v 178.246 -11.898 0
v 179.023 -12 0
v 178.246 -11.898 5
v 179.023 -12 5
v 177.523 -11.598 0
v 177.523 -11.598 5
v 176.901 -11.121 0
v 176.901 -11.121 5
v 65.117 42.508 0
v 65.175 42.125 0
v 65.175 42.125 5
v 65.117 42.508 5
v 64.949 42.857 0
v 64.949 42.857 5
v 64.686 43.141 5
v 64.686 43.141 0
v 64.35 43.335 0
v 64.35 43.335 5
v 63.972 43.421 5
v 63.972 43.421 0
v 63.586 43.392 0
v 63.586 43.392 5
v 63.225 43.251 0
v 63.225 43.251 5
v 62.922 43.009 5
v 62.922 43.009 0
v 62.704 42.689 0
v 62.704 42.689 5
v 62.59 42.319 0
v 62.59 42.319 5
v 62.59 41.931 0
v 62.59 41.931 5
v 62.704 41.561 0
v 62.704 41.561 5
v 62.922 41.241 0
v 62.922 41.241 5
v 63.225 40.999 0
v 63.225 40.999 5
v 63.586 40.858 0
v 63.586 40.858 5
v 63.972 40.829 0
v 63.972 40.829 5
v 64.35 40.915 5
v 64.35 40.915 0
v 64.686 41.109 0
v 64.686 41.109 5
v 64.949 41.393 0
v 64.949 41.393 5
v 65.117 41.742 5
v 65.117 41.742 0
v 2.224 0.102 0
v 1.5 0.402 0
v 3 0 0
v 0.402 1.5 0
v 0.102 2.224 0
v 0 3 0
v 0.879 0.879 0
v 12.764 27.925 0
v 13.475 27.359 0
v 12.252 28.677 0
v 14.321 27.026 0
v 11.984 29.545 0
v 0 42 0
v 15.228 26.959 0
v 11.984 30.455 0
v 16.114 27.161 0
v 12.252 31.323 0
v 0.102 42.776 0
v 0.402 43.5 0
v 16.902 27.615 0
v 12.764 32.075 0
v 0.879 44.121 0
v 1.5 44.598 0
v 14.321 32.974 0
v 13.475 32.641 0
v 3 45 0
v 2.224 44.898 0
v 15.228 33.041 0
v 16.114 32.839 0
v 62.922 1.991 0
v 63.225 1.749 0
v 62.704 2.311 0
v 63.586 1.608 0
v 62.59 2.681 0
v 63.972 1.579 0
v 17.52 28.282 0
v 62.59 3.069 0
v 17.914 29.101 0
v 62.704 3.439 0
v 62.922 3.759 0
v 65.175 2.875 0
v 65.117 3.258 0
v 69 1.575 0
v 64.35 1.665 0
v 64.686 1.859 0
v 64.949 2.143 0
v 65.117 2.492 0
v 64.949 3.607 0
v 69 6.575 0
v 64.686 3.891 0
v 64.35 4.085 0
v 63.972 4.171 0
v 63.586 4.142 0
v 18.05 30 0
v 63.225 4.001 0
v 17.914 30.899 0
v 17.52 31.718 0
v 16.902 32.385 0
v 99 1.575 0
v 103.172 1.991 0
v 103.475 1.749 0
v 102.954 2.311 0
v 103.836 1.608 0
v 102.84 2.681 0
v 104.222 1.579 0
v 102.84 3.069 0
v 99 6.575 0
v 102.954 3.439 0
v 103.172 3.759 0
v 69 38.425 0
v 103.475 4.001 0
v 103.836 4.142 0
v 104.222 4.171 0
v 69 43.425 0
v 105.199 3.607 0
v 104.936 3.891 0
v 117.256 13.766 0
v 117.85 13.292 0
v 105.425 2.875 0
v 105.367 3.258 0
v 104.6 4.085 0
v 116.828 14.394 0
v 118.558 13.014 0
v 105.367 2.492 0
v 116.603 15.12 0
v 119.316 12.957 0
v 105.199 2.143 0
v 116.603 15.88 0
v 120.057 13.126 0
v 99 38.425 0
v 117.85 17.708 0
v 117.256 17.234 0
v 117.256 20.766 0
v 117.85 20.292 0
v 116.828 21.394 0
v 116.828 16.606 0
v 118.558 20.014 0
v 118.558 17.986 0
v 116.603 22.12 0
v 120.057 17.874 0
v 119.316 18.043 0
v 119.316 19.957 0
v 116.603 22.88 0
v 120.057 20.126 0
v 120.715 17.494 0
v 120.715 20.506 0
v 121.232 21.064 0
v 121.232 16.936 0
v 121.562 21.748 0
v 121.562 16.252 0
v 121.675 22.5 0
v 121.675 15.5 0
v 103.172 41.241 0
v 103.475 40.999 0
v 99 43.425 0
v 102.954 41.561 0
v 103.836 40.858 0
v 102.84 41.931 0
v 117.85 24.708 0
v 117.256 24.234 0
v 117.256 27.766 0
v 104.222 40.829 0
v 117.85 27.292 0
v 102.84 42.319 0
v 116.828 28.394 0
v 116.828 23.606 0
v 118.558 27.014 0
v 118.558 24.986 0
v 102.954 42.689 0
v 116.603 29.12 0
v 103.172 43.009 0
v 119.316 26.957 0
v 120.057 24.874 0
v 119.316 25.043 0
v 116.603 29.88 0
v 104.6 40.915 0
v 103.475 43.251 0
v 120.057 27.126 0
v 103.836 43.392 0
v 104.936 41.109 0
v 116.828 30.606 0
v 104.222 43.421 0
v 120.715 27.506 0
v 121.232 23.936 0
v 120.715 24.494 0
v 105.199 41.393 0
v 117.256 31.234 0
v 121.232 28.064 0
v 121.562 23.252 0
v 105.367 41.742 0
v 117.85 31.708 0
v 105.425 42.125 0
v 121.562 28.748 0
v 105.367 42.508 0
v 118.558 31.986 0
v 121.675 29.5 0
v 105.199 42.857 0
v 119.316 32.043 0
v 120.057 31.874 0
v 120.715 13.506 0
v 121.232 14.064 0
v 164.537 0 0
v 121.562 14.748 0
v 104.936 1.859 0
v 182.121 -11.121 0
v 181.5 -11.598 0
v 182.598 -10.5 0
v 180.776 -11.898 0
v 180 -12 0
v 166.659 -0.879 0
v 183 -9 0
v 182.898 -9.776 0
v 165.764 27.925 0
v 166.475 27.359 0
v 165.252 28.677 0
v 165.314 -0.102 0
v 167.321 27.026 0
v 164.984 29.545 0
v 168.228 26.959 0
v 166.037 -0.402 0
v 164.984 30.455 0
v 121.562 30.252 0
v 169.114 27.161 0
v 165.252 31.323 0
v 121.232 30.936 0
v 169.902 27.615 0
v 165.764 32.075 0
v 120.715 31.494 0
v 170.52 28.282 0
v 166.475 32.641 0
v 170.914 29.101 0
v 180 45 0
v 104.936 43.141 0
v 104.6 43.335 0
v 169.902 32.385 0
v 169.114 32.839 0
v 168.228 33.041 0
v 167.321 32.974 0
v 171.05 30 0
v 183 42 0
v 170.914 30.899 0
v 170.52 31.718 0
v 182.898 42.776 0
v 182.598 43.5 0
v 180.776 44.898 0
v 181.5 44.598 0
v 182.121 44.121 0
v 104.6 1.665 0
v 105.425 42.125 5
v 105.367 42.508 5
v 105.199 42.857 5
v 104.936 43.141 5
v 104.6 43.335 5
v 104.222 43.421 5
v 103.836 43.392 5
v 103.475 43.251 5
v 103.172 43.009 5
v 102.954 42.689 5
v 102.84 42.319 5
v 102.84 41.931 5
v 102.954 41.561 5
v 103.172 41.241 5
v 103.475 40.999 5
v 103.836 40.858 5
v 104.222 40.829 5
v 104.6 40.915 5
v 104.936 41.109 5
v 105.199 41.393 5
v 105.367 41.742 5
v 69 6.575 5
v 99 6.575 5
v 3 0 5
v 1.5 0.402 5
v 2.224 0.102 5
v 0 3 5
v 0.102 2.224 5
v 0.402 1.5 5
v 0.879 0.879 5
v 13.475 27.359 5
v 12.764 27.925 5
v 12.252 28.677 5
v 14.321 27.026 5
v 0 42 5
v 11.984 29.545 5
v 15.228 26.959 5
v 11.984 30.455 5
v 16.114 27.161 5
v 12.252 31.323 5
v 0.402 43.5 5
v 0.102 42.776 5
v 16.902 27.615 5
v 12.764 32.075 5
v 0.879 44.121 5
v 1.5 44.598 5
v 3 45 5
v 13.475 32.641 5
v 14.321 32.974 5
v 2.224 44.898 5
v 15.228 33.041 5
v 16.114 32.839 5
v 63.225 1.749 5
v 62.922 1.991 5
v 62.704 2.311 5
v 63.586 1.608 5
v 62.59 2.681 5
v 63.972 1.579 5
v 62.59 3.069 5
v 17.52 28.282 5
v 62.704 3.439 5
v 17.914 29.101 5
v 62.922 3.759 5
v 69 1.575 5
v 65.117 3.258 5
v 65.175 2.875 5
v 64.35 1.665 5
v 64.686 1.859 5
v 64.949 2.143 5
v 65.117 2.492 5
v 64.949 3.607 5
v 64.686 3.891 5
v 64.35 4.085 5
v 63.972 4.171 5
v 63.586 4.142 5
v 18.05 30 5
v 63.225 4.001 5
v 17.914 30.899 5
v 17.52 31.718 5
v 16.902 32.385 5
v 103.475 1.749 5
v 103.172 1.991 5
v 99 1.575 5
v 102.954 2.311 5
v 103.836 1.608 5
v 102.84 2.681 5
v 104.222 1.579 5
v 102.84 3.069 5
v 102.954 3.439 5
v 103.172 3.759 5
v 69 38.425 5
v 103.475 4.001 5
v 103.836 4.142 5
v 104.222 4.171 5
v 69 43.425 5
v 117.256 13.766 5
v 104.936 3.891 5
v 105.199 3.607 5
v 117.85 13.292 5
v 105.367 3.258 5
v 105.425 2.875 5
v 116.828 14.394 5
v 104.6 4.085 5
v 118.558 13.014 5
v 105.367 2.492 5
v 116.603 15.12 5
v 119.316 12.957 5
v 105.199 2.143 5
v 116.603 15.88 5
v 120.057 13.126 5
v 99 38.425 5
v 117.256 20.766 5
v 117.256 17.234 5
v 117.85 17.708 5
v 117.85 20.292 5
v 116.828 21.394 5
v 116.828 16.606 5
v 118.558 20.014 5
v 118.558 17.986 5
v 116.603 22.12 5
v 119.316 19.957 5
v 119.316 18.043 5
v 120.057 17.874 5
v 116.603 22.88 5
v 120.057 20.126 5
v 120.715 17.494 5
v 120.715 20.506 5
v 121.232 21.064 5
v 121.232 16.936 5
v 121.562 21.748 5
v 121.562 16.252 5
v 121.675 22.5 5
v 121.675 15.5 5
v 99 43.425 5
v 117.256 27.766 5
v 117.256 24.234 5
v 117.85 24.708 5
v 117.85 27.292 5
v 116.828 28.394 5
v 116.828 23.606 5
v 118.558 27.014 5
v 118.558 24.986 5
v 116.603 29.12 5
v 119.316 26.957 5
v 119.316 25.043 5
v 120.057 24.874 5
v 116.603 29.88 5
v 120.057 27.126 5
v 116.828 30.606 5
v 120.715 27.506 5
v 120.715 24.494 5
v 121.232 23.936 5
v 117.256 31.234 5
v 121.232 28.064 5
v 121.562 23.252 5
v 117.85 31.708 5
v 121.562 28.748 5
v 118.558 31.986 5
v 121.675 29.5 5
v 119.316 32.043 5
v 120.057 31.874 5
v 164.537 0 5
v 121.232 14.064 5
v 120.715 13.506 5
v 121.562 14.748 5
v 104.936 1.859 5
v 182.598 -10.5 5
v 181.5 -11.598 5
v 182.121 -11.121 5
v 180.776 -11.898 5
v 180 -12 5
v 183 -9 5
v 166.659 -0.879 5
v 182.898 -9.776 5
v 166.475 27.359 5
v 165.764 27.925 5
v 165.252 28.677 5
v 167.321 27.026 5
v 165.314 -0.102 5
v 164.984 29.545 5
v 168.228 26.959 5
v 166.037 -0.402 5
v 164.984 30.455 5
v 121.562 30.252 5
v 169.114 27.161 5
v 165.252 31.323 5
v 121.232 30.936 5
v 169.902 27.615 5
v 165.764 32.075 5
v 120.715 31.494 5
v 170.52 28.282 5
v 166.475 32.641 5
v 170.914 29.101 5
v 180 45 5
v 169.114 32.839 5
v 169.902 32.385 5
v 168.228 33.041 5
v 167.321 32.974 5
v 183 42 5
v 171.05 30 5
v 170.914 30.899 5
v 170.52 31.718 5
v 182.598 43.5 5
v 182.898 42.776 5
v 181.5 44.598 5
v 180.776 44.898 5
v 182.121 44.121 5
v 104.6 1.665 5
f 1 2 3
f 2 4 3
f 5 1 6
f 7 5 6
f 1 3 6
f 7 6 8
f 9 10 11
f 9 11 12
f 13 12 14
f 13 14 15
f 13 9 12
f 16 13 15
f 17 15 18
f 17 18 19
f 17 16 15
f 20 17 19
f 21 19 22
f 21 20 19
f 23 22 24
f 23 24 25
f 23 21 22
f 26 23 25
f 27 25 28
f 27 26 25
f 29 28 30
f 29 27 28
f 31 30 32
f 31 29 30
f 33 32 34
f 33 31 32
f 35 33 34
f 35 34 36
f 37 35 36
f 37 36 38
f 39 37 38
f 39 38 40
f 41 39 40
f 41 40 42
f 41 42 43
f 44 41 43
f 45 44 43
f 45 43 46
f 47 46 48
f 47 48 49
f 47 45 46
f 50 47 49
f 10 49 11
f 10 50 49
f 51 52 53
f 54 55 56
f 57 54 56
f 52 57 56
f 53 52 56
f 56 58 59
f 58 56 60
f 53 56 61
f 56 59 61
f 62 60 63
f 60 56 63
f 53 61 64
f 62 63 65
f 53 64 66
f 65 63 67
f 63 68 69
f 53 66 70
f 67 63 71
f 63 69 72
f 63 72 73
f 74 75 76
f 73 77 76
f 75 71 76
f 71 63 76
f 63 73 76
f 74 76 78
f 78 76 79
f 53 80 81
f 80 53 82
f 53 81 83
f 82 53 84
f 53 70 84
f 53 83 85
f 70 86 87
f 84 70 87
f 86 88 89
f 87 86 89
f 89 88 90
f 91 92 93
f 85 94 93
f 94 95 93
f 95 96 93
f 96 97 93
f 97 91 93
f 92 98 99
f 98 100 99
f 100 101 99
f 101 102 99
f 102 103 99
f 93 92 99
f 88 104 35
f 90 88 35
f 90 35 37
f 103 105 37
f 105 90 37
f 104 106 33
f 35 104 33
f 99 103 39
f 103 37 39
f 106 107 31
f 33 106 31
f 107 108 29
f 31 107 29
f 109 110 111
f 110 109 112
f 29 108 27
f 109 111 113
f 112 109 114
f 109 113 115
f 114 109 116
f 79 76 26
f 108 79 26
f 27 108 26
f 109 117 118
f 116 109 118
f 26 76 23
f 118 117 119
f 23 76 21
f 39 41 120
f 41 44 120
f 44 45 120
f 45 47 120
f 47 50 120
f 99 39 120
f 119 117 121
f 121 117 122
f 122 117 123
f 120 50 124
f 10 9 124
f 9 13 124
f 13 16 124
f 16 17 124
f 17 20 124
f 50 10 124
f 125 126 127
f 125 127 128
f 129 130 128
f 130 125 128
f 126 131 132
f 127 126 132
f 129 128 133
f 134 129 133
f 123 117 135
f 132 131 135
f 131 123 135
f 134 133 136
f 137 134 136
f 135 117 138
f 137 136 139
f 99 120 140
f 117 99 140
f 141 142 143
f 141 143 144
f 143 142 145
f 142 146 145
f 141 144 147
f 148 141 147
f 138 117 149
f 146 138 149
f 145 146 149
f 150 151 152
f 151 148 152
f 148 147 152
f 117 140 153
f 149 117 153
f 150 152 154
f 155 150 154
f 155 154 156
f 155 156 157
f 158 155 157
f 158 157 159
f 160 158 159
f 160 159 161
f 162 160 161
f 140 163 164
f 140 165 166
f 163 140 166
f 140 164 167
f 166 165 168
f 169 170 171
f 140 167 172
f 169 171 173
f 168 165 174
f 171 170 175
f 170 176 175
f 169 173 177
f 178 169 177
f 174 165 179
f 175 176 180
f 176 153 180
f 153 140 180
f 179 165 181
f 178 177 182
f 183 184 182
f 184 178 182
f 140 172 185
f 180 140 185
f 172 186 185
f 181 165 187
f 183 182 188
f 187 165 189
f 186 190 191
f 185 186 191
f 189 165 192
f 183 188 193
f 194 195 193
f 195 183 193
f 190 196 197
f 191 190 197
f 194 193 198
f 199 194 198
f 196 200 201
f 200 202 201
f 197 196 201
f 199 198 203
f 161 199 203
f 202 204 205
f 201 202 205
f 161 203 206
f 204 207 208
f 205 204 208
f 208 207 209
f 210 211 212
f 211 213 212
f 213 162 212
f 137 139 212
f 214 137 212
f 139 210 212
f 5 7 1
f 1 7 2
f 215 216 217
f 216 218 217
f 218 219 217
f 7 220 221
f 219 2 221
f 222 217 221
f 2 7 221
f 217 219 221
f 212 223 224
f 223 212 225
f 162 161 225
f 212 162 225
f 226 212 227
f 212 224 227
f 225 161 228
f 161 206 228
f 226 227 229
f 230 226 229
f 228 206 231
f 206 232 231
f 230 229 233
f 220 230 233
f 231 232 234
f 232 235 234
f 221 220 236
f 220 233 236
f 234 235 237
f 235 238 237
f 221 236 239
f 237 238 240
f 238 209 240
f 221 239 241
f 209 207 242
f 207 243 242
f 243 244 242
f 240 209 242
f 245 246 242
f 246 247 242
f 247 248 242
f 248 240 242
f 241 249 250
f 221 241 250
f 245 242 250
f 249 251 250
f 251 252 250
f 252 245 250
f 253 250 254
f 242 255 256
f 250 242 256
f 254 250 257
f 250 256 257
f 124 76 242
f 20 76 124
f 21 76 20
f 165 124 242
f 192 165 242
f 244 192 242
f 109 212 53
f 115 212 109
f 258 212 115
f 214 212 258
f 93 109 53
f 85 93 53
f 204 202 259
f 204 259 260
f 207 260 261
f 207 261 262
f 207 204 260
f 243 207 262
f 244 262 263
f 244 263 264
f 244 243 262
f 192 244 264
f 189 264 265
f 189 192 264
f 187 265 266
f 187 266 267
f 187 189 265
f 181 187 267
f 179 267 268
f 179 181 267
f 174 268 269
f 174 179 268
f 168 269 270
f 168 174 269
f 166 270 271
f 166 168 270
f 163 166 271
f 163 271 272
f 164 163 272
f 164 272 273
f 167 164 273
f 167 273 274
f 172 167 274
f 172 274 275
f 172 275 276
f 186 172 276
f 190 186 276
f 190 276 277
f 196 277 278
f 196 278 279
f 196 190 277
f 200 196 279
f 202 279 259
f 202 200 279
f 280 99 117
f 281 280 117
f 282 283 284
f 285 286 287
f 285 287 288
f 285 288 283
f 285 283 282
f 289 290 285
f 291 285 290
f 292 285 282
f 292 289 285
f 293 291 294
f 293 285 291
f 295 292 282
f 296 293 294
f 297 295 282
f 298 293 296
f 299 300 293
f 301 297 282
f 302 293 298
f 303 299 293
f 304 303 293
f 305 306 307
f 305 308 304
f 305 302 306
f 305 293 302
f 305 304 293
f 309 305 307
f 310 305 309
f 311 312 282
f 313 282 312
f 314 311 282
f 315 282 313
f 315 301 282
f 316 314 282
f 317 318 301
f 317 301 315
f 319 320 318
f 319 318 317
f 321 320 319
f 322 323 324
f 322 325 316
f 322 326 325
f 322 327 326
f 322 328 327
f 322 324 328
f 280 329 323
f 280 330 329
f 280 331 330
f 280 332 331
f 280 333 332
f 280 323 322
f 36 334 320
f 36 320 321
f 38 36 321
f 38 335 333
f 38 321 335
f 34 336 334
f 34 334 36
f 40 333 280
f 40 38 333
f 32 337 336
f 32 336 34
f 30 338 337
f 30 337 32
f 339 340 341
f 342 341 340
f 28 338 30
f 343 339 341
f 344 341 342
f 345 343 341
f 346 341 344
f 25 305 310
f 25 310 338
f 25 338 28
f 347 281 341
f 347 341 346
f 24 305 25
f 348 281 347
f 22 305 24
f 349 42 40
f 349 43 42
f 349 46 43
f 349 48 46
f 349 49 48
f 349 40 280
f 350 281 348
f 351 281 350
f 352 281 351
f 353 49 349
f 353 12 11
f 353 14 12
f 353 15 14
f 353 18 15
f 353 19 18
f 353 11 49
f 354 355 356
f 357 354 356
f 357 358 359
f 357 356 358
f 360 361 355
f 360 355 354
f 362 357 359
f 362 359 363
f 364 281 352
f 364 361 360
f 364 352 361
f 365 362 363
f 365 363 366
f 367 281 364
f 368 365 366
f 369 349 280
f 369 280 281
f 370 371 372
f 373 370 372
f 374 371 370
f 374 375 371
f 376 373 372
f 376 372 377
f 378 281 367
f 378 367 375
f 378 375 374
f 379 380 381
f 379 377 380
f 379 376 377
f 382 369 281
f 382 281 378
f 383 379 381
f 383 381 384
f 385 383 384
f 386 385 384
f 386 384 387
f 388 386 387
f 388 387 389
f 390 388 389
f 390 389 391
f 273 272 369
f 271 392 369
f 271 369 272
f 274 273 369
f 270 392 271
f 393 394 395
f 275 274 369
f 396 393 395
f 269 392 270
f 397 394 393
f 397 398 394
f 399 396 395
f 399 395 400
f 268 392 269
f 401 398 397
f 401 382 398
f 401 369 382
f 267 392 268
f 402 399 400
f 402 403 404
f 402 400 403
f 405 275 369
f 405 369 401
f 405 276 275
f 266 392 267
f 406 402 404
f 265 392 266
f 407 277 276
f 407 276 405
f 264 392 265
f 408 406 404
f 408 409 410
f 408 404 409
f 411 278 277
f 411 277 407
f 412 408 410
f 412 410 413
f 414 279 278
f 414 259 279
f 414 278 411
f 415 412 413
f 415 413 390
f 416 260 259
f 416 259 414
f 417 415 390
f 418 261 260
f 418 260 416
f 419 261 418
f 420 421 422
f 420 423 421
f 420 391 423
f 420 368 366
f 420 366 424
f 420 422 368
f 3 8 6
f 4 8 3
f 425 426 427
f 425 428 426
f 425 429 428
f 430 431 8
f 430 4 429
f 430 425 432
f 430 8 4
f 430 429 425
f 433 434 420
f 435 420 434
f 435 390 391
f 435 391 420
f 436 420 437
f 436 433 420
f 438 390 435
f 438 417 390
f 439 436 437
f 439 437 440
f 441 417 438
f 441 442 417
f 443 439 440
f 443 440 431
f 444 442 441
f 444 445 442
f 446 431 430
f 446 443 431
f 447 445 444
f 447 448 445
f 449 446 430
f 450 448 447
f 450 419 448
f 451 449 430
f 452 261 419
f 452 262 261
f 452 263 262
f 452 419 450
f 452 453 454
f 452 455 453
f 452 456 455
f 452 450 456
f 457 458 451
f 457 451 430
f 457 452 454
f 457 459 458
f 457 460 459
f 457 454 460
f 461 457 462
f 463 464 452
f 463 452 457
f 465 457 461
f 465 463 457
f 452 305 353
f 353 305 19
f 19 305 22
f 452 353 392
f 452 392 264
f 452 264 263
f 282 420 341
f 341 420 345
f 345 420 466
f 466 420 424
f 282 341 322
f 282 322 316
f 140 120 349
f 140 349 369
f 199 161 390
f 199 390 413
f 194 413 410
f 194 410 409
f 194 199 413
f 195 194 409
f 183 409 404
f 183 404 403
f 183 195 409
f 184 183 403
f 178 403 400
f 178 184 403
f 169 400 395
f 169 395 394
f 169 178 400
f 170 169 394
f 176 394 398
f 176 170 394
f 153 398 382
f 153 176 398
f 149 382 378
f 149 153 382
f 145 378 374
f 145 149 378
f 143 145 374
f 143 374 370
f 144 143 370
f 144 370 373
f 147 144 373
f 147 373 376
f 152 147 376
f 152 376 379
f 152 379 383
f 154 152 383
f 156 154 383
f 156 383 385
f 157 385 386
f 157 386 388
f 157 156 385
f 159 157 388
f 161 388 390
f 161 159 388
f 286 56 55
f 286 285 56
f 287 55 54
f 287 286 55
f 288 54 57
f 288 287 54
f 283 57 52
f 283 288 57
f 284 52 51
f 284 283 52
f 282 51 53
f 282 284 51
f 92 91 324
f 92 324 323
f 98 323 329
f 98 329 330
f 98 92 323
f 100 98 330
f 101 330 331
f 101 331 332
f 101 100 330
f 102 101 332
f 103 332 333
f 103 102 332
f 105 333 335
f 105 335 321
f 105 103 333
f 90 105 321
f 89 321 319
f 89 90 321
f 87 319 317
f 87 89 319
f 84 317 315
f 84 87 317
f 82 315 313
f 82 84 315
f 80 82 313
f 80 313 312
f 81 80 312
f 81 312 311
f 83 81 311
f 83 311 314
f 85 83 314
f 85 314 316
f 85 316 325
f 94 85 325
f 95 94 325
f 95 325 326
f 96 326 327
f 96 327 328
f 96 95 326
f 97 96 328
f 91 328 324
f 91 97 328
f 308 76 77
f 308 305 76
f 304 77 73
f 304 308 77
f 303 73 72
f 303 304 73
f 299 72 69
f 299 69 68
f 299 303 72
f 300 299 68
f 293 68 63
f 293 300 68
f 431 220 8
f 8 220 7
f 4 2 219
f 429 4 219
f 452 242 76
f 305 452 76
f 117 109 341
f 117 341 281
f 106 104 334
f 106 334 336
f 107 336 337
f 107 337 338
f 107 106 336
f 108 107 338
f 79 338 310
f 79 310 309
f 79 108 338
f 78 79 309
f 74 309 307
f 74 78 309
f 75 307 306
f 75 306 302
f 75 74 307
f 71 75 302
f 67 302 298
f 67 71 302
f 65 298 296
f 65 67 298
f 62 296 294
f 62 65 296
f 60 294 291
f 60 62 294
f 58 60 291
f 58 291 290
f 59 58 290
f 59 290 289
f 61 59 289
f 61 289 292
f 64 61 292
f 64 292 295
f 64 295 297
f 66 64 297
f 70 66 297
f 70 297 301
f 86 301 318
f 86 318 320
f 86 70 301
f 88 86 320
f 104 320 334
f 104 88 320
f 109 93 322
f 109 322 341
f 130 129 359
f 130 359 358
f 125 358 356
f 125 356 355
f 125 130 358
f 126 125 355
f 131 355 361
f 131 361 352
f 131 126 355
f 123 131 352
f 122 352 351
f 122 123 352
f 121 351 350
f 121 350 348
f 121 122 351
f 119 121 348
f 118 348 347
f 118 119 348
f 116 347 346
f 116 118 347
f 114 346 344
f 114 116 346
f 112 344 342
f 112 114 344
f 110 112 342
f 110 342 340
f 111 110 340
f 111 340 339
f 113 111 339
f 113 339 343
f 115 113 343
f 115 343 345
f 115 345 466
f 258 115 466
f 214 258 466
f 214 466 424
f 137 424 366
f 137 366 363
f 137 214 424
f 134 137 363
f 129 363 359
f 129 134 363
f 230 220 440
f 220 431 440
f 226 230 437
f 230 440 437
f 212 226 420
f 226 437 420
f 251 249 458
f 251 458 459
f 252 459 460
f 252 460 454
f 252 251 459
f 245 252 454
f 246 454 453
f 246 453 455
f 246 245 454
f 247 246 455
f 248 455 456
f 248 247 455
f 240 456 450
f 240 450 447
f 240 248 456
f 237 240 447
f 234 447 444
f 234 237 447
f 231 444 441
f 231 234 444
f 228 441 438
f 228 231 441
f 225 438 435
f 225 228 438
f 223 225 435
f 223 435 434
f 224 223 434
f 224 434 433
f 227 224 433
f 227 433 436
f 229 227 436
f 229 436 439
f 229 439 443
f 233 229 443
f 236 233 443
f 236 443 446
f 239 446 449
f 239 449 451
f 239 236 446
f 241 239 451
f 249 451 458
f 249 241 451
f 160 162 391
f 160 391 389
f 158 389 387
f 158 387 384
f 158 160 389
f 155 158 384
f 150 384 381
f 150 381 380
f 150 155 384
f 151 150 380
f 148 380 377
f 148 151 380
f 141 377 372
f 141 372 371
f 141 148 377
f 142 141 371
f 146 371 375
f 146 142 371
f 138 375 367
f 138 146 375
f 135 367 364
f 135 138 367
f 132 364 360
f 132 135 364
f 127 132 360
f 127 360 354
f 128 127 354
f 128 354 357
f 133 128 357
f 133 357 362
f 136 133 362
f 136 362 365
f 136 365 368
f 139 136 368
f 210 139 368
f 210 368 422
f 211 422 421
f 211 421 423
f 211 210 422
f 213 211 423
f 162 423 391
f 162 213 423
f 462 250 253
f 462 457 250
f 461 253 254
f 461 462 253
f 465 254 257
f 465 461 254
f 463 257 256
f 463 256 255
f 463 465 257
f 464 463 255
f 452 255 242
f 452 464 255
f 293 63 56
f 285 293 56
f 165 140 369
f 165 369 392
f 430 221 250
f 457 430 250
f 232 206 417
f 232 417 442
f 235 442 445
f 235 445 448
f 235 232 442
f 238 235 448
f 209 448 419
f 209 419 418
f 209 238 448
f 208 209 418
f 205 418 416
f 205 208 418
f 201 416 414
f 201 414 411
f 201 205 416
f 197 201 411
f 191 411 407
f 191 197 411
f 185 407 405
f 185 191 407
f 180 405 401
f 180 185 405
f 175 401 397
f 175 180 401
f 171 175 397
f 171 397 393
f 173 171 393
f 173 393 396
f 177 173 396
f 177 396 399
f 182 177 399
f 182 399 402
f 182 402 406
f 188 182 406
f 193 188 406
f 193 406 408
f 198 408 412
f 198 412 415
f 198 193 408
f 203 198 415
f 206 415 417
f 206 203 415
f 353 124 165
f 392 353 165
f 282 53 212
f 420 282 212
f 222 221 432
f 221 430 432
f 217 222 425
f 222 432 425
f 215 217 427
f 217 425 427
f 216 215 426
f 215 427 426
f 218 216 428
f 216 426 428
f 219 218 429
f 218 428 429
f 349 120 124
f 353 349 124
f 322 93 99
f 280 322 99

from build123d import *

# Parameters (mm, degrees)
SKETCH1_R           = 3.05
SKETCH1_R_2         = 2.55
SKETCH1_R_3         = 1.3
SKETCH1_W           = 30
SKETCH1_H           = 5
BOSS_EXTRUDE1_DEPTH = 5
FILLET1_R           = 3


with BuildPart() as part:
    # Sketch1 → Boss-Extrude1 (new body)
    with BuildSketch(Plane.XY):
        Polygon((183, -12), (183, 45), (0, 45), (0, 0), (165.78, 0), (177.78, -12), align=None)
        with Locations((15, 30)):
            Circle(SKETCH1_R, mode=Mode.SUBTRACT)
        with Locations((168, 30)):
            Circle(SKETCH1_R, mode=Mode.SUBTRACT)
        with Locations((119.125, 29.5)):
            Circle(SKETCH1_R_2, mode=Mode.SUBTRACT)
        with Locations((119.125, 22.5)):
            Circle(SKETCH1_R_2, mode=Mode.SUBTRACT)
        with Locations((119.125, 15.5)):
            Circle(SKETCH1_R_2, mode=Mode.SUBTRACT)
        with Locations((63.875, 42.125)):
            Circle(SKETCH1_R_3, mode=Mode.SUBTRACT)
        with Locations((104.125, 42.125)):
            Circle(SKETCH1_R_3, mode=Mode.SUBTRACT)
        with Locations((104.125, 2.875)):
            Circle(SKETCH1_R_3, mode=Mode.SUBTRACT)
        with Locations((63.875, 2.875)):
            Circle(SKETCH1_R_3, mode=Mode.SUBTRACT)
        with Locations((84, 40.925)):
            Rectangle(SKETCH1_W, SKETCH1_H, mode=Mode.SUBTRACT)
        with Locations((84, 4.075)):
            Rectangle(SKETCH1_W, SKETCH1_H, mode=Mode.SUBTRACT)
    extrude(amount=BOSS_EXTRUDE1_DEPTH)

    # Fillet1
    fillet1_edges = [part.edges().sort_by_distance(p)[0] for p in [
        (0, 0, 2.5),
        (0, 45, 2.5),
        (183, 45, 2.5),
        (183, -12, 2.5),
        (177.78, -12, 2.5),
        (165.78, 0, 2.5),
    ]]
    fillet(fillet1_edges, radius=FILLET1_R)


solid = part.part
